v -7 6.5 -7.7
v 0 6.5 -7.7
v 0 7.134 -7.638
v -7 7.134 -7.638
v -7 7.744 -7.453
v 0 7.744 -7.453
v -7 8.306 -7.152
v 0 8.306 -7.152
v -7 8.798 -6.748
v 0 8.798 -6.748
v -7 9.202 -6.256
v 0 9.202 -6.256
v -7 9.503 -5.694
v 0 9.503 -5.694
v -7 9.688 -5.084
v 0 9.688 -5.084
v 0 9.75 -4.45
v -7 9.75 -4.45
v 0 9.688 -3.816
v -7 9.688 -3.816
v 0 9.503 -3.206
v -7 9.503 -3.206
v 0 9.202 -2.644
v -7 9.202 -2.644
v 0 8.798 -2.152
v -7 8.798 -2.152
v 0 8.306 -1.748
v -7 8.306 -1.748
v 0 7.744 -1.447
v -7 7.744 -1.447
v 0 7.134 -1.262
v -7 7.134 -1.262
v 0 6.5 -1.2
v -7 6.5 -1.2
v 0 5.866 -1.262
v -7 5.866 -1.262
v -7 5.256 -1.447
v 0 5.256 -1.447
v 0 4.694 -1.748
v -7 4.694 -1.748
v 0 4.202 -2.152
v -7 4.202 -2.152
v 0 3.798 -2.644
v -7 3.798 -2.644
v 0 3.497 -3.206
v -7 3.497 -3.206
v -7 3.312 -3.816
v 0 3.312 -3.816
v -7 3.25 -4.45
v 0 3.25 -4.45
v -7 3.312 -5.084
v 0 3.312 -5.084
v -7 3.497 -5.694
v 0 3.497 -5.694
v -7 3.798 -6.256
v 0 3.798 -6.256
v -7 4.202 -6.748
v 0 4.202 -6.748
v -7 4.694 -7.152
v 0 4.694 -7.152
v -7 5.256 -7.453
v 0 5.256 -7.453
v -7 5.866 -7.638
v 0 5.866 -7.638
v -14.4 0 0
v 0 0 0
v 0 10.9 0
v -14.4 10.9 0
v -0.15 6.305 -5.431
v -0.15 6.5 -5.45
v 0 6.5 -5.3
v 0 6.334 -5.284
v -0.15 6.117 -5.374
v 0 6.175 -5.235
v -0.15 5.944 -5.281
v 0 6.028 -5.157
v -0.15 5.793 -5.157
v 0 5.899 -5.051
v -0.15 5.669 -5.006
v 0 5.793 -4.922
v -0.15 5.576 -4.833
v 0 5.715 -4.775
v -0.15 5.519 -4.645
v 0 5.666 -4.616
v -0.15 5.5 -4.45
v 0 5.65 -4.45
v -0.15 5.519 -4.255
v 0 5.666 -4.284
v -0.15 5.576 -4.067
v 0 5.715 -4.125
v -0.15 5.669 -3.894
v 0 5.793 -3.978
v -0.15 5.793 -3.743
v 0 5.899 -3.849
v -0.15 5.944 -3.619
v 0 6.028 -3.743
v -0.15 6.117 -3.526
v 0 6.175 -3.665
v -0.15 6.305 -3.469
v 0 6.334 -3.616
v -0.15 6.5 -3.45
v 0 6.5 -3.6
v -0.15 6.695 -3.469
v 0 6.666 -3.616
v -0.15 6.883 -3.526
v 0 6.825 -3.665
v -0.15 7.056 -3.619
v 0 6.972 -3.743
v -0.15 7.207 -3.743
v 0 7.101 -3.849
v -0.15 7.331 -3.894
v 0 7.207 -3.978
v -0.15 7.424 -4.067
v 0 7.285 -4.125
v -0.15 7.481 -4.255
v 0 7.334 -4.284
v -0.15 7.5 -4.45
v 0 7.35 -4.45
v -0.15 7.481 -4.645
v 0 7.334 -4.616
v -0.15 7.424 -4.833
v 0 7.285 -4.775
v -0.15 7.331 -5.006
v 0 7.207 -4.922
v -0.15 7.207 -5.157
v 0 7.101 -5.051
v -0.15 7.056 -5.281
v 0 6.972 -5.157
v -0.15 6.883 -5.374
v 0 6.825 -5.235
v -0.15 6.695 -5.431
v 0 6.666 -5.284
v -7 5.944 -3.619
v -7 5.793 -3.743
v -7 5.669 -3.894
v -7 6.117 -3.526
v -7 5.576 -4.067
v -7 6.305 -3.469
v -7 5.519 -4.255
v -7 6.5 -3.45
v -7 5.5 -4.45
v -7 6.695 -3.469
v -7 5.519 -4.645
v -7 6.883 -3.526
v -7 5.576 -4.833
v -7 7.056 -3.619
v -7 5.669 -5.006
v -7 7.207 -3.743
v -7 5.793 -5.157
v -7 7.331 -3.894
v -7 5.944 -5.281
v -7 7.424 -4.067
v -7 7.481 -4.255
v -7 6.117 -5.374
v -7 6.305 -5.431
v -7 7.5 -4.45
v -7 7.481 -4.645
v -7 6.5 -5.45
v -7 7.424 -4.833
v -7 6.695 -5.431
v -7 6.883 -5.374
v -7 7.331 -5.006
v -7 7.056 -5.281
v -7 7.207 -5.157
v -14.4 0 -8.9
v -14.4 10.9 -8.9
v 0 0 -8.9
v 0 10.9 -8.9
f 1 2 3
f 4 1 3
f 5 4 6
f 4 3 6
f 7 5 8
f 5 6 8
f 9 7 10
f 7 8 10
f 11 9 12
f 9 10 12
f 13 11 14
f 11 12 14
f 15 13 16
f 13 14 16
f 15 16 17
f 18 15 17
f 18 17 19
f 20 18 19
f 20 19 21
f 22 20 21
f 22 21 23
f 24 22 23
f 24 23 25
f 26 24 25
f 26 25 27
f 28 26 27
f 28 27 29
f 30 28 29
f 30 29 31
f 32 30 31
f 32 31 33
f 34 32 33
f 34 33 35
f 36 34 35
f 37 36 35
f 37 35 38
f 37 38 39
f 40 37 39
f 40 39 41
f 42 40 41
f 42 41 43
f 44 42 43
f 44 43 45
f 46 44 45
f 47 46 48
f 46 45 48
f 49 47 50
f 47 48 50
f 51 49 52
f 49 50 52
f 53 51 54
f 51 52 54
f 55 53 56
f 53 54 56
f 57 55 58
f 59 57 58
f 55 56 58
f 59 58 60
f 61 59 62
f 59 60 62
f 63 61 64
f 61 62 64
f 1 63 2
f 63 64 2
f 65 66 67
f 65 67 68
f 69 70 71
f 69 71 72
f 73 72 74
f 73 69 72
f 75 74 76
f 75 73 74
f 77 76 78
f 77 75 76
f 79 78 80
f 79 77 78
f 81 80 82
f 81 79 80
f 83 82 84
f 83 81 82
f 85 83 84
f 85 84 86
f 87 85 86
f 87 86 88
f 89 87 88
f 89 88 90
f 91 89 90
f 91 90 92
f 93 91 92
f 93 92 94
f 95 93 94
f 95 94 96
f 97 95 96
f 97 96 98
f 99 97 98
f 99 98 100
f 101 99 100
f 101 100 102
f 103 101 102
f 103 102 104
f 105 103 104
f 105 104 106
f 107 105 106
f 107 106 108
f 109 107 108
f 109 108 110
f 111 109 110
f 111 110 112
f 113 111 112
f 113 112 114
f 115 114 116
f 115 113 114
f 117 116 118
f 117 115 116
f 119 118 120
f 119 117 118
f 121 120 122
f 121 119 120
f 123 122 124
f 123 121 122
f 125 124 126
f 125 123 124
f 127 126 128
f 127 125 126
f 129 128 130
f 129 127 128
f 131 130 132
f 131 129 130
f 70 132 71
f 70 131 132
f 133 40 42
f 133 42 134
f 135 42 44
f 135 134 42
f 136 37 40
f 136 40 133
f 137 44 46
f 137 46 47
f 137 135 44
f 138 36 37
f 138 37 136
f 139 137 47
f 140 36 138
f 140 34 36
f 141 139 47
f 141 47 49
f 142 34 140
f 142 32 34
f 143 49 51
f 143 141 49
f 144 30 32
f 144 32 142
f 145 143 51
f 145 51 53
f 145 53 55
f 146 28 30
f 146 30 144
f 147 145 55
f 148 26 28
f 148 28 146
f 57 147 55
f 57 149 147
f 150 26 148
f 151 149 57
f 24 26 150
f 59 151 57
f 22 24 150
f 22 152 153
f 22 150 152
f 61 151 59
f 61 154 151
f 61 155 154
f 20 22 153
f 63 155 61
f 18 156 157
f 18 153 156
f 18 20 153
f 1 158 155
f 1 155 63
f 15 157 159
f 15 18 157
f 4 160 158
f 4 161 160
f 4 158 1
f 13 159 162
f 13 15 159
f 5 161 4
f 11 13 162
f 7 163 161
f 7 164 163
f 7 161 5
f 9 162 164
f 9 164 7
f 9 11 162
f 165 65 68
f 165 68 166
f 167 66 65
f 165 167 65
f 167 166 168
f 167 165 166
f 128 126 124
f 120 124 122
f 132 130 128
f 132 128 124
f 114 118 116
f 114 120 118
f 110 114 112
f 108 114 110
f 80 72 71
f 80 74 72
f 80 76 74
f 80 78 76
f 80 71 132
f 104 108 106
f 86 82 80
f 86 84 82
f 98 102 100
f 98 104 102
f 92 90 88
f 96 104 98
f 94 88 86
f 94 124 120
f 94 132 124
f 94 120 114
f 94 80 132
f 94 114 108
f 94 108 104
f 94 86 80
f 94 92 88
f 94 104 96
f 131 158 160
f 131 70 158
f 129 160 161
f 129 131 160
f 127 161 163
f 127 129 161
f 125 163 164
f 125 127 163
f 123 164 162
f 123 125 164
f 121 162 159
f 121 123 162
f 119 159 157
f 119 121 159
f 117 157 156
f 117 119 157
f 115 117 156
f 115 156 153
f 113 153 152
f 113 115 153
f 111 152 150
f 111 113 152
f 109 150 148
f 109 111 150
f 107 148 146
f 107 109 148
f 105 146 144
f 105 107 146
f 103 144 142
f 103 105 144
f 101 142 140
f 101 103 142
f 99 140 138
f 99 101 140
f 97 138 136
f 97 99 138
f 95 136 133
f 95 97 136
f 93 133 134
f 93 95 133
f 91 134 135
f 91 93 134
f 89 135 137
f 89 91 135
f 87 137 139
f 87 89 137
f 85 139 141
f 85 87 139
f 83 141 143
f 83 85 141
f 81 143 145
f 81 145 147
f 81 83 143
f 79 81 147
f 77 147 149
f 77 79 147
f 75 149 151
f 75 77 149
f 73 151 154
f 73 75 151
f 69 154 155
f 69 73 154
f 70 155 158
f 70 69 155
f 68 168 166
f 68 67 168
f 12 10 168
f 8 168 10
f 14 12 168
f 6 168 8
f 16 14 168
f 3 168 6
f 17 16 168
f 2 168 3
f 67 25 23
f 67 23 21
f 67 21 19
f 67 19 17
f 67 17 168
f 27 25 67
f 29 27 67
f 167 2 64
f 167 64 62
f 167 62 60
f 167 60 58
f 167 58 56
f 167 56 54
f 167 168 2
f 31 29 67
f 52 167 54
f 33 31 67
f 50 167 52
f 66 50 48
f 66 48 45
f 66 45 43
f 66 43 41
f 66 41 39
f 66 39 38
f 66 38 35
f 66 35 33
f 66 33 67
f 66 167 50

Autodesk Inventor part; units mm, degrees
ref_plane "YZ Plane" through (0, 0, 0) normal (1, 0, 0) x (0, 1, 0)
ref_plane "XZ Plane" through (0, 0, 0) normal (0, 1, 0) x (-1, 0, 0)
ref_plane "XY Plane" through (0, 0, 0) normal (0, 0, 1) x (1, 0, 0)
sketch "Szkic1" plane through (0, 0, 0) normal (0, 1, 0) x (-1, 0, 0)
  line L0 (14.4, -8.9) -> (0, -8.9)
  line L1 (0, -8.9) -> (0, 0)
  line L2 (0, 0) -> (14.4, 0)
  line L3 (14.4, 0) -> (14.4, -8.9)
  dimension "d0" = 8.9
  dimension "d1" = 14.4
extrude "Wyciągnięcie proste1" add sketch "Szkic1" along normal blind 10.9
sketch "Szkic2" plane through (0, 0, 0) normal (1, 0, 0) x (0, 0, -1)
  line L0 (0, 10.9) -> (8.9, 10.9) projected
  line L1 (4.45, 10.9) -> (4.45, 0)
  line L2 (0, 0) -> (8.9, 0) projected
  circle A0 centre (4.45, 6.5) radius 1
  circle A1 centre (4.45, 6.5) radius 3.25
  dimension "d4" = 2
  dimension "d5" = 6.5
  dimension "d6" = 6.5
extrude "Wyciągnięcie proste2" cut sketch "Szkic2" against normal blind 7 contours A1 L1 A0 | L1 A0 A1
chamfer "Faza1" distance 0.15 angle 45 1 edges at (0, 6.5, -3.45)
equation "\"d0\" = input_a"
equation "\"d1\" = input_b"
equation "\"d2\" = input_wys"
equation "\"gniazdo_M2_glebokosc\" = 1.5"
equation "\"gniazdo_M2_D1\" = 4.5"
equation "\"gniazdo_M2_D2\" = 2.6"
equation "\"insert_D\" = 2.9"
equation "\"insert_glebokosc\" = 7"
equation "\"podstawa_wys\" = 2"
equation "\"podstawa_otwory_montazowe_poz_x\" = 4"
equation "\"podstawa_otwory_montazowe_poz_y\" = 4"
equation "\"podstawa_zaokraglenie\" = 3"
equation "\"obudowa_wys\" = 45"
equation "\"obudowa_grubosc\" = 2"
equation "\"obudowa_kontrolki_a\" = 38"
equation "\"obudowa_otwory_montazowe_poz_x\" = 4"
equation "\"obudowa_otwory_montazowe_poz_y\" = 4"
equation "\"obudowa_otwory_montazowe_material_x\" = 8"
equation "\"obudowa_otwory_montazowe_material_y\" = 8"
equation "\"obudowa_zaokraglenie\" = 3"
equation "\"obudowa_otwory_io1_D\" = 12"
equation "\"obudowa_otwory_io1_wys\" = 25"
equation "\"obudowa_otwory_io1_poz\" = 55"
equation "\"obudowa_otwory_io2_D\" = 12"
equation "\"obudowa_otwory_io2_wys\" = 25"
equation "\"obudowa_otwory_io2_poz\" = 38"
equation "\"obudowa_otwory_pot_D\" = 7.2"
equation "\"input_a\" = 8.9"
equation "\"input_b\" = 14.4"
equation "\"input_wys\" = 10.9"
equation "\"obudowa_MTS_otwor_D\" = 6.2"
equation "\"obudowa_pot_poz_y\" = 15"
equation "\"obudowa_s_poz_x\" = 78"
equation "\"obudowa_s_D\" = 6.2"
equation "\"obudowa_s_poz_y\" = 15"
equation "\"obudowa_s_rozstaw_y\" = 16"
equation "\"pcb_rozstaw_x\" = 92"
equation "\"pcb_rozstaw_y\" = 58"
equation "\"obudowa_pcb_grubosc_scianki\" = 6"
equation "\"pcb_grubosc_scianki\" = 6"
equation "\"pcb_poz_y\" = 29"
equation "\"pcb_wys_bloku\" = 35"
equation "\"obudowa_footswitch_poz_y\" = 68"
equation "\"obudowa_footswitch_poz_x\" = 35"
equation "\"obudowa_footswitch_D\" = 12.3"
equation "\"obudowa_led_indicator_D\" = 3.5"
equation "\"obudowa_led_indicator_poz_x\" = 55"
equation "\"obudowa_podkladka_otwory\" = 4"
equation "\"podstawa_uchwyt_grubosc\" = 3"
equation "\"podstawa_uchwyt_wysokosc\" = 15"
equation "\"obudowa_uchwyt_grubosc\" = 2"
equation "\"pbudowa_uchwyt_podciecie_wys\" = 1.5"
equation "\"obudowa_uchwyt_wysokosc_wew\" = 26.3"
equation "\"obudowa_uchwyt_szerokosc_wew\" = 17.5"
equation "\"obudowa_gniazdo_poz\" = 25"
equation "\"obudowa_uchwyt_kolnierz_wys\" = 55"
equation "\"obudowa_uchwyt_poz_y\" = 2"
equation "\"obudowa_uchwyt_poz_z\" = 3"
equation "\"obudowa_podciecie_inout_wys\" = 6"
equation "\"obudowa_podciecie_logo_wys\" = 34"
equation "\"obudowa_podciecie_logo_szerokosc\" = 25"
equation "\"obudowa_pot_pozycjonowanie_wys\" = 13"
equation "\"obudowa_pot_pozycjonowanie_szerokosc\" = 2.8"
equation "\"obudowa_pot_pozycjonowanie_glebokosc\" = 1.4"
equation "\"obudowa_led_mocowanie_wys\" = 6"
equation "\"obudowa_led_mocowanie_poz\" = 46"
equation "\"obudowa_led_mocowanie_D\" = 5.5"
equation "\"obudowa_led_mocowanie_grubosc\" = 8"
equation "\"holder_led_grubosc\" = 2.5"
equation "\"holder_led_dlugosc\" = 28"
equation "\"holder_led_uchwyt_D\" = 5"
equation "\"holder_led_uchwyt_wysokosc\" = 5"
equation "\"holder_led_uchwyt_szerokosc\" = 8"
equation "\"holder_gniazdo_b\" = 5"
equation "\"holder_gniazdo_grubosc\" = 2.5"
equation "\"holder_gniazdo_a\" = 28"
equation "\"podstawa_mocowanie_DC_a\" = 7"
equation "\"podstawa_mocowanie_DC_b\" = 8.9"
equation "\"podstawa_mocowanie_DC_wys\" = 6"
equation "\"holder_gniazdo_odleglosc_miedzy_ramionami\" = 9.2"
equation "\"holder_gniazdo_grubosc_ramion\" = 1.5"
equation "\"holder_gniazdo_wys\" = 8"
equation "\"holder_gniazdo_uchwyt_poz\" = 5"
properties part number "9V_input" material "Polipropylen"
